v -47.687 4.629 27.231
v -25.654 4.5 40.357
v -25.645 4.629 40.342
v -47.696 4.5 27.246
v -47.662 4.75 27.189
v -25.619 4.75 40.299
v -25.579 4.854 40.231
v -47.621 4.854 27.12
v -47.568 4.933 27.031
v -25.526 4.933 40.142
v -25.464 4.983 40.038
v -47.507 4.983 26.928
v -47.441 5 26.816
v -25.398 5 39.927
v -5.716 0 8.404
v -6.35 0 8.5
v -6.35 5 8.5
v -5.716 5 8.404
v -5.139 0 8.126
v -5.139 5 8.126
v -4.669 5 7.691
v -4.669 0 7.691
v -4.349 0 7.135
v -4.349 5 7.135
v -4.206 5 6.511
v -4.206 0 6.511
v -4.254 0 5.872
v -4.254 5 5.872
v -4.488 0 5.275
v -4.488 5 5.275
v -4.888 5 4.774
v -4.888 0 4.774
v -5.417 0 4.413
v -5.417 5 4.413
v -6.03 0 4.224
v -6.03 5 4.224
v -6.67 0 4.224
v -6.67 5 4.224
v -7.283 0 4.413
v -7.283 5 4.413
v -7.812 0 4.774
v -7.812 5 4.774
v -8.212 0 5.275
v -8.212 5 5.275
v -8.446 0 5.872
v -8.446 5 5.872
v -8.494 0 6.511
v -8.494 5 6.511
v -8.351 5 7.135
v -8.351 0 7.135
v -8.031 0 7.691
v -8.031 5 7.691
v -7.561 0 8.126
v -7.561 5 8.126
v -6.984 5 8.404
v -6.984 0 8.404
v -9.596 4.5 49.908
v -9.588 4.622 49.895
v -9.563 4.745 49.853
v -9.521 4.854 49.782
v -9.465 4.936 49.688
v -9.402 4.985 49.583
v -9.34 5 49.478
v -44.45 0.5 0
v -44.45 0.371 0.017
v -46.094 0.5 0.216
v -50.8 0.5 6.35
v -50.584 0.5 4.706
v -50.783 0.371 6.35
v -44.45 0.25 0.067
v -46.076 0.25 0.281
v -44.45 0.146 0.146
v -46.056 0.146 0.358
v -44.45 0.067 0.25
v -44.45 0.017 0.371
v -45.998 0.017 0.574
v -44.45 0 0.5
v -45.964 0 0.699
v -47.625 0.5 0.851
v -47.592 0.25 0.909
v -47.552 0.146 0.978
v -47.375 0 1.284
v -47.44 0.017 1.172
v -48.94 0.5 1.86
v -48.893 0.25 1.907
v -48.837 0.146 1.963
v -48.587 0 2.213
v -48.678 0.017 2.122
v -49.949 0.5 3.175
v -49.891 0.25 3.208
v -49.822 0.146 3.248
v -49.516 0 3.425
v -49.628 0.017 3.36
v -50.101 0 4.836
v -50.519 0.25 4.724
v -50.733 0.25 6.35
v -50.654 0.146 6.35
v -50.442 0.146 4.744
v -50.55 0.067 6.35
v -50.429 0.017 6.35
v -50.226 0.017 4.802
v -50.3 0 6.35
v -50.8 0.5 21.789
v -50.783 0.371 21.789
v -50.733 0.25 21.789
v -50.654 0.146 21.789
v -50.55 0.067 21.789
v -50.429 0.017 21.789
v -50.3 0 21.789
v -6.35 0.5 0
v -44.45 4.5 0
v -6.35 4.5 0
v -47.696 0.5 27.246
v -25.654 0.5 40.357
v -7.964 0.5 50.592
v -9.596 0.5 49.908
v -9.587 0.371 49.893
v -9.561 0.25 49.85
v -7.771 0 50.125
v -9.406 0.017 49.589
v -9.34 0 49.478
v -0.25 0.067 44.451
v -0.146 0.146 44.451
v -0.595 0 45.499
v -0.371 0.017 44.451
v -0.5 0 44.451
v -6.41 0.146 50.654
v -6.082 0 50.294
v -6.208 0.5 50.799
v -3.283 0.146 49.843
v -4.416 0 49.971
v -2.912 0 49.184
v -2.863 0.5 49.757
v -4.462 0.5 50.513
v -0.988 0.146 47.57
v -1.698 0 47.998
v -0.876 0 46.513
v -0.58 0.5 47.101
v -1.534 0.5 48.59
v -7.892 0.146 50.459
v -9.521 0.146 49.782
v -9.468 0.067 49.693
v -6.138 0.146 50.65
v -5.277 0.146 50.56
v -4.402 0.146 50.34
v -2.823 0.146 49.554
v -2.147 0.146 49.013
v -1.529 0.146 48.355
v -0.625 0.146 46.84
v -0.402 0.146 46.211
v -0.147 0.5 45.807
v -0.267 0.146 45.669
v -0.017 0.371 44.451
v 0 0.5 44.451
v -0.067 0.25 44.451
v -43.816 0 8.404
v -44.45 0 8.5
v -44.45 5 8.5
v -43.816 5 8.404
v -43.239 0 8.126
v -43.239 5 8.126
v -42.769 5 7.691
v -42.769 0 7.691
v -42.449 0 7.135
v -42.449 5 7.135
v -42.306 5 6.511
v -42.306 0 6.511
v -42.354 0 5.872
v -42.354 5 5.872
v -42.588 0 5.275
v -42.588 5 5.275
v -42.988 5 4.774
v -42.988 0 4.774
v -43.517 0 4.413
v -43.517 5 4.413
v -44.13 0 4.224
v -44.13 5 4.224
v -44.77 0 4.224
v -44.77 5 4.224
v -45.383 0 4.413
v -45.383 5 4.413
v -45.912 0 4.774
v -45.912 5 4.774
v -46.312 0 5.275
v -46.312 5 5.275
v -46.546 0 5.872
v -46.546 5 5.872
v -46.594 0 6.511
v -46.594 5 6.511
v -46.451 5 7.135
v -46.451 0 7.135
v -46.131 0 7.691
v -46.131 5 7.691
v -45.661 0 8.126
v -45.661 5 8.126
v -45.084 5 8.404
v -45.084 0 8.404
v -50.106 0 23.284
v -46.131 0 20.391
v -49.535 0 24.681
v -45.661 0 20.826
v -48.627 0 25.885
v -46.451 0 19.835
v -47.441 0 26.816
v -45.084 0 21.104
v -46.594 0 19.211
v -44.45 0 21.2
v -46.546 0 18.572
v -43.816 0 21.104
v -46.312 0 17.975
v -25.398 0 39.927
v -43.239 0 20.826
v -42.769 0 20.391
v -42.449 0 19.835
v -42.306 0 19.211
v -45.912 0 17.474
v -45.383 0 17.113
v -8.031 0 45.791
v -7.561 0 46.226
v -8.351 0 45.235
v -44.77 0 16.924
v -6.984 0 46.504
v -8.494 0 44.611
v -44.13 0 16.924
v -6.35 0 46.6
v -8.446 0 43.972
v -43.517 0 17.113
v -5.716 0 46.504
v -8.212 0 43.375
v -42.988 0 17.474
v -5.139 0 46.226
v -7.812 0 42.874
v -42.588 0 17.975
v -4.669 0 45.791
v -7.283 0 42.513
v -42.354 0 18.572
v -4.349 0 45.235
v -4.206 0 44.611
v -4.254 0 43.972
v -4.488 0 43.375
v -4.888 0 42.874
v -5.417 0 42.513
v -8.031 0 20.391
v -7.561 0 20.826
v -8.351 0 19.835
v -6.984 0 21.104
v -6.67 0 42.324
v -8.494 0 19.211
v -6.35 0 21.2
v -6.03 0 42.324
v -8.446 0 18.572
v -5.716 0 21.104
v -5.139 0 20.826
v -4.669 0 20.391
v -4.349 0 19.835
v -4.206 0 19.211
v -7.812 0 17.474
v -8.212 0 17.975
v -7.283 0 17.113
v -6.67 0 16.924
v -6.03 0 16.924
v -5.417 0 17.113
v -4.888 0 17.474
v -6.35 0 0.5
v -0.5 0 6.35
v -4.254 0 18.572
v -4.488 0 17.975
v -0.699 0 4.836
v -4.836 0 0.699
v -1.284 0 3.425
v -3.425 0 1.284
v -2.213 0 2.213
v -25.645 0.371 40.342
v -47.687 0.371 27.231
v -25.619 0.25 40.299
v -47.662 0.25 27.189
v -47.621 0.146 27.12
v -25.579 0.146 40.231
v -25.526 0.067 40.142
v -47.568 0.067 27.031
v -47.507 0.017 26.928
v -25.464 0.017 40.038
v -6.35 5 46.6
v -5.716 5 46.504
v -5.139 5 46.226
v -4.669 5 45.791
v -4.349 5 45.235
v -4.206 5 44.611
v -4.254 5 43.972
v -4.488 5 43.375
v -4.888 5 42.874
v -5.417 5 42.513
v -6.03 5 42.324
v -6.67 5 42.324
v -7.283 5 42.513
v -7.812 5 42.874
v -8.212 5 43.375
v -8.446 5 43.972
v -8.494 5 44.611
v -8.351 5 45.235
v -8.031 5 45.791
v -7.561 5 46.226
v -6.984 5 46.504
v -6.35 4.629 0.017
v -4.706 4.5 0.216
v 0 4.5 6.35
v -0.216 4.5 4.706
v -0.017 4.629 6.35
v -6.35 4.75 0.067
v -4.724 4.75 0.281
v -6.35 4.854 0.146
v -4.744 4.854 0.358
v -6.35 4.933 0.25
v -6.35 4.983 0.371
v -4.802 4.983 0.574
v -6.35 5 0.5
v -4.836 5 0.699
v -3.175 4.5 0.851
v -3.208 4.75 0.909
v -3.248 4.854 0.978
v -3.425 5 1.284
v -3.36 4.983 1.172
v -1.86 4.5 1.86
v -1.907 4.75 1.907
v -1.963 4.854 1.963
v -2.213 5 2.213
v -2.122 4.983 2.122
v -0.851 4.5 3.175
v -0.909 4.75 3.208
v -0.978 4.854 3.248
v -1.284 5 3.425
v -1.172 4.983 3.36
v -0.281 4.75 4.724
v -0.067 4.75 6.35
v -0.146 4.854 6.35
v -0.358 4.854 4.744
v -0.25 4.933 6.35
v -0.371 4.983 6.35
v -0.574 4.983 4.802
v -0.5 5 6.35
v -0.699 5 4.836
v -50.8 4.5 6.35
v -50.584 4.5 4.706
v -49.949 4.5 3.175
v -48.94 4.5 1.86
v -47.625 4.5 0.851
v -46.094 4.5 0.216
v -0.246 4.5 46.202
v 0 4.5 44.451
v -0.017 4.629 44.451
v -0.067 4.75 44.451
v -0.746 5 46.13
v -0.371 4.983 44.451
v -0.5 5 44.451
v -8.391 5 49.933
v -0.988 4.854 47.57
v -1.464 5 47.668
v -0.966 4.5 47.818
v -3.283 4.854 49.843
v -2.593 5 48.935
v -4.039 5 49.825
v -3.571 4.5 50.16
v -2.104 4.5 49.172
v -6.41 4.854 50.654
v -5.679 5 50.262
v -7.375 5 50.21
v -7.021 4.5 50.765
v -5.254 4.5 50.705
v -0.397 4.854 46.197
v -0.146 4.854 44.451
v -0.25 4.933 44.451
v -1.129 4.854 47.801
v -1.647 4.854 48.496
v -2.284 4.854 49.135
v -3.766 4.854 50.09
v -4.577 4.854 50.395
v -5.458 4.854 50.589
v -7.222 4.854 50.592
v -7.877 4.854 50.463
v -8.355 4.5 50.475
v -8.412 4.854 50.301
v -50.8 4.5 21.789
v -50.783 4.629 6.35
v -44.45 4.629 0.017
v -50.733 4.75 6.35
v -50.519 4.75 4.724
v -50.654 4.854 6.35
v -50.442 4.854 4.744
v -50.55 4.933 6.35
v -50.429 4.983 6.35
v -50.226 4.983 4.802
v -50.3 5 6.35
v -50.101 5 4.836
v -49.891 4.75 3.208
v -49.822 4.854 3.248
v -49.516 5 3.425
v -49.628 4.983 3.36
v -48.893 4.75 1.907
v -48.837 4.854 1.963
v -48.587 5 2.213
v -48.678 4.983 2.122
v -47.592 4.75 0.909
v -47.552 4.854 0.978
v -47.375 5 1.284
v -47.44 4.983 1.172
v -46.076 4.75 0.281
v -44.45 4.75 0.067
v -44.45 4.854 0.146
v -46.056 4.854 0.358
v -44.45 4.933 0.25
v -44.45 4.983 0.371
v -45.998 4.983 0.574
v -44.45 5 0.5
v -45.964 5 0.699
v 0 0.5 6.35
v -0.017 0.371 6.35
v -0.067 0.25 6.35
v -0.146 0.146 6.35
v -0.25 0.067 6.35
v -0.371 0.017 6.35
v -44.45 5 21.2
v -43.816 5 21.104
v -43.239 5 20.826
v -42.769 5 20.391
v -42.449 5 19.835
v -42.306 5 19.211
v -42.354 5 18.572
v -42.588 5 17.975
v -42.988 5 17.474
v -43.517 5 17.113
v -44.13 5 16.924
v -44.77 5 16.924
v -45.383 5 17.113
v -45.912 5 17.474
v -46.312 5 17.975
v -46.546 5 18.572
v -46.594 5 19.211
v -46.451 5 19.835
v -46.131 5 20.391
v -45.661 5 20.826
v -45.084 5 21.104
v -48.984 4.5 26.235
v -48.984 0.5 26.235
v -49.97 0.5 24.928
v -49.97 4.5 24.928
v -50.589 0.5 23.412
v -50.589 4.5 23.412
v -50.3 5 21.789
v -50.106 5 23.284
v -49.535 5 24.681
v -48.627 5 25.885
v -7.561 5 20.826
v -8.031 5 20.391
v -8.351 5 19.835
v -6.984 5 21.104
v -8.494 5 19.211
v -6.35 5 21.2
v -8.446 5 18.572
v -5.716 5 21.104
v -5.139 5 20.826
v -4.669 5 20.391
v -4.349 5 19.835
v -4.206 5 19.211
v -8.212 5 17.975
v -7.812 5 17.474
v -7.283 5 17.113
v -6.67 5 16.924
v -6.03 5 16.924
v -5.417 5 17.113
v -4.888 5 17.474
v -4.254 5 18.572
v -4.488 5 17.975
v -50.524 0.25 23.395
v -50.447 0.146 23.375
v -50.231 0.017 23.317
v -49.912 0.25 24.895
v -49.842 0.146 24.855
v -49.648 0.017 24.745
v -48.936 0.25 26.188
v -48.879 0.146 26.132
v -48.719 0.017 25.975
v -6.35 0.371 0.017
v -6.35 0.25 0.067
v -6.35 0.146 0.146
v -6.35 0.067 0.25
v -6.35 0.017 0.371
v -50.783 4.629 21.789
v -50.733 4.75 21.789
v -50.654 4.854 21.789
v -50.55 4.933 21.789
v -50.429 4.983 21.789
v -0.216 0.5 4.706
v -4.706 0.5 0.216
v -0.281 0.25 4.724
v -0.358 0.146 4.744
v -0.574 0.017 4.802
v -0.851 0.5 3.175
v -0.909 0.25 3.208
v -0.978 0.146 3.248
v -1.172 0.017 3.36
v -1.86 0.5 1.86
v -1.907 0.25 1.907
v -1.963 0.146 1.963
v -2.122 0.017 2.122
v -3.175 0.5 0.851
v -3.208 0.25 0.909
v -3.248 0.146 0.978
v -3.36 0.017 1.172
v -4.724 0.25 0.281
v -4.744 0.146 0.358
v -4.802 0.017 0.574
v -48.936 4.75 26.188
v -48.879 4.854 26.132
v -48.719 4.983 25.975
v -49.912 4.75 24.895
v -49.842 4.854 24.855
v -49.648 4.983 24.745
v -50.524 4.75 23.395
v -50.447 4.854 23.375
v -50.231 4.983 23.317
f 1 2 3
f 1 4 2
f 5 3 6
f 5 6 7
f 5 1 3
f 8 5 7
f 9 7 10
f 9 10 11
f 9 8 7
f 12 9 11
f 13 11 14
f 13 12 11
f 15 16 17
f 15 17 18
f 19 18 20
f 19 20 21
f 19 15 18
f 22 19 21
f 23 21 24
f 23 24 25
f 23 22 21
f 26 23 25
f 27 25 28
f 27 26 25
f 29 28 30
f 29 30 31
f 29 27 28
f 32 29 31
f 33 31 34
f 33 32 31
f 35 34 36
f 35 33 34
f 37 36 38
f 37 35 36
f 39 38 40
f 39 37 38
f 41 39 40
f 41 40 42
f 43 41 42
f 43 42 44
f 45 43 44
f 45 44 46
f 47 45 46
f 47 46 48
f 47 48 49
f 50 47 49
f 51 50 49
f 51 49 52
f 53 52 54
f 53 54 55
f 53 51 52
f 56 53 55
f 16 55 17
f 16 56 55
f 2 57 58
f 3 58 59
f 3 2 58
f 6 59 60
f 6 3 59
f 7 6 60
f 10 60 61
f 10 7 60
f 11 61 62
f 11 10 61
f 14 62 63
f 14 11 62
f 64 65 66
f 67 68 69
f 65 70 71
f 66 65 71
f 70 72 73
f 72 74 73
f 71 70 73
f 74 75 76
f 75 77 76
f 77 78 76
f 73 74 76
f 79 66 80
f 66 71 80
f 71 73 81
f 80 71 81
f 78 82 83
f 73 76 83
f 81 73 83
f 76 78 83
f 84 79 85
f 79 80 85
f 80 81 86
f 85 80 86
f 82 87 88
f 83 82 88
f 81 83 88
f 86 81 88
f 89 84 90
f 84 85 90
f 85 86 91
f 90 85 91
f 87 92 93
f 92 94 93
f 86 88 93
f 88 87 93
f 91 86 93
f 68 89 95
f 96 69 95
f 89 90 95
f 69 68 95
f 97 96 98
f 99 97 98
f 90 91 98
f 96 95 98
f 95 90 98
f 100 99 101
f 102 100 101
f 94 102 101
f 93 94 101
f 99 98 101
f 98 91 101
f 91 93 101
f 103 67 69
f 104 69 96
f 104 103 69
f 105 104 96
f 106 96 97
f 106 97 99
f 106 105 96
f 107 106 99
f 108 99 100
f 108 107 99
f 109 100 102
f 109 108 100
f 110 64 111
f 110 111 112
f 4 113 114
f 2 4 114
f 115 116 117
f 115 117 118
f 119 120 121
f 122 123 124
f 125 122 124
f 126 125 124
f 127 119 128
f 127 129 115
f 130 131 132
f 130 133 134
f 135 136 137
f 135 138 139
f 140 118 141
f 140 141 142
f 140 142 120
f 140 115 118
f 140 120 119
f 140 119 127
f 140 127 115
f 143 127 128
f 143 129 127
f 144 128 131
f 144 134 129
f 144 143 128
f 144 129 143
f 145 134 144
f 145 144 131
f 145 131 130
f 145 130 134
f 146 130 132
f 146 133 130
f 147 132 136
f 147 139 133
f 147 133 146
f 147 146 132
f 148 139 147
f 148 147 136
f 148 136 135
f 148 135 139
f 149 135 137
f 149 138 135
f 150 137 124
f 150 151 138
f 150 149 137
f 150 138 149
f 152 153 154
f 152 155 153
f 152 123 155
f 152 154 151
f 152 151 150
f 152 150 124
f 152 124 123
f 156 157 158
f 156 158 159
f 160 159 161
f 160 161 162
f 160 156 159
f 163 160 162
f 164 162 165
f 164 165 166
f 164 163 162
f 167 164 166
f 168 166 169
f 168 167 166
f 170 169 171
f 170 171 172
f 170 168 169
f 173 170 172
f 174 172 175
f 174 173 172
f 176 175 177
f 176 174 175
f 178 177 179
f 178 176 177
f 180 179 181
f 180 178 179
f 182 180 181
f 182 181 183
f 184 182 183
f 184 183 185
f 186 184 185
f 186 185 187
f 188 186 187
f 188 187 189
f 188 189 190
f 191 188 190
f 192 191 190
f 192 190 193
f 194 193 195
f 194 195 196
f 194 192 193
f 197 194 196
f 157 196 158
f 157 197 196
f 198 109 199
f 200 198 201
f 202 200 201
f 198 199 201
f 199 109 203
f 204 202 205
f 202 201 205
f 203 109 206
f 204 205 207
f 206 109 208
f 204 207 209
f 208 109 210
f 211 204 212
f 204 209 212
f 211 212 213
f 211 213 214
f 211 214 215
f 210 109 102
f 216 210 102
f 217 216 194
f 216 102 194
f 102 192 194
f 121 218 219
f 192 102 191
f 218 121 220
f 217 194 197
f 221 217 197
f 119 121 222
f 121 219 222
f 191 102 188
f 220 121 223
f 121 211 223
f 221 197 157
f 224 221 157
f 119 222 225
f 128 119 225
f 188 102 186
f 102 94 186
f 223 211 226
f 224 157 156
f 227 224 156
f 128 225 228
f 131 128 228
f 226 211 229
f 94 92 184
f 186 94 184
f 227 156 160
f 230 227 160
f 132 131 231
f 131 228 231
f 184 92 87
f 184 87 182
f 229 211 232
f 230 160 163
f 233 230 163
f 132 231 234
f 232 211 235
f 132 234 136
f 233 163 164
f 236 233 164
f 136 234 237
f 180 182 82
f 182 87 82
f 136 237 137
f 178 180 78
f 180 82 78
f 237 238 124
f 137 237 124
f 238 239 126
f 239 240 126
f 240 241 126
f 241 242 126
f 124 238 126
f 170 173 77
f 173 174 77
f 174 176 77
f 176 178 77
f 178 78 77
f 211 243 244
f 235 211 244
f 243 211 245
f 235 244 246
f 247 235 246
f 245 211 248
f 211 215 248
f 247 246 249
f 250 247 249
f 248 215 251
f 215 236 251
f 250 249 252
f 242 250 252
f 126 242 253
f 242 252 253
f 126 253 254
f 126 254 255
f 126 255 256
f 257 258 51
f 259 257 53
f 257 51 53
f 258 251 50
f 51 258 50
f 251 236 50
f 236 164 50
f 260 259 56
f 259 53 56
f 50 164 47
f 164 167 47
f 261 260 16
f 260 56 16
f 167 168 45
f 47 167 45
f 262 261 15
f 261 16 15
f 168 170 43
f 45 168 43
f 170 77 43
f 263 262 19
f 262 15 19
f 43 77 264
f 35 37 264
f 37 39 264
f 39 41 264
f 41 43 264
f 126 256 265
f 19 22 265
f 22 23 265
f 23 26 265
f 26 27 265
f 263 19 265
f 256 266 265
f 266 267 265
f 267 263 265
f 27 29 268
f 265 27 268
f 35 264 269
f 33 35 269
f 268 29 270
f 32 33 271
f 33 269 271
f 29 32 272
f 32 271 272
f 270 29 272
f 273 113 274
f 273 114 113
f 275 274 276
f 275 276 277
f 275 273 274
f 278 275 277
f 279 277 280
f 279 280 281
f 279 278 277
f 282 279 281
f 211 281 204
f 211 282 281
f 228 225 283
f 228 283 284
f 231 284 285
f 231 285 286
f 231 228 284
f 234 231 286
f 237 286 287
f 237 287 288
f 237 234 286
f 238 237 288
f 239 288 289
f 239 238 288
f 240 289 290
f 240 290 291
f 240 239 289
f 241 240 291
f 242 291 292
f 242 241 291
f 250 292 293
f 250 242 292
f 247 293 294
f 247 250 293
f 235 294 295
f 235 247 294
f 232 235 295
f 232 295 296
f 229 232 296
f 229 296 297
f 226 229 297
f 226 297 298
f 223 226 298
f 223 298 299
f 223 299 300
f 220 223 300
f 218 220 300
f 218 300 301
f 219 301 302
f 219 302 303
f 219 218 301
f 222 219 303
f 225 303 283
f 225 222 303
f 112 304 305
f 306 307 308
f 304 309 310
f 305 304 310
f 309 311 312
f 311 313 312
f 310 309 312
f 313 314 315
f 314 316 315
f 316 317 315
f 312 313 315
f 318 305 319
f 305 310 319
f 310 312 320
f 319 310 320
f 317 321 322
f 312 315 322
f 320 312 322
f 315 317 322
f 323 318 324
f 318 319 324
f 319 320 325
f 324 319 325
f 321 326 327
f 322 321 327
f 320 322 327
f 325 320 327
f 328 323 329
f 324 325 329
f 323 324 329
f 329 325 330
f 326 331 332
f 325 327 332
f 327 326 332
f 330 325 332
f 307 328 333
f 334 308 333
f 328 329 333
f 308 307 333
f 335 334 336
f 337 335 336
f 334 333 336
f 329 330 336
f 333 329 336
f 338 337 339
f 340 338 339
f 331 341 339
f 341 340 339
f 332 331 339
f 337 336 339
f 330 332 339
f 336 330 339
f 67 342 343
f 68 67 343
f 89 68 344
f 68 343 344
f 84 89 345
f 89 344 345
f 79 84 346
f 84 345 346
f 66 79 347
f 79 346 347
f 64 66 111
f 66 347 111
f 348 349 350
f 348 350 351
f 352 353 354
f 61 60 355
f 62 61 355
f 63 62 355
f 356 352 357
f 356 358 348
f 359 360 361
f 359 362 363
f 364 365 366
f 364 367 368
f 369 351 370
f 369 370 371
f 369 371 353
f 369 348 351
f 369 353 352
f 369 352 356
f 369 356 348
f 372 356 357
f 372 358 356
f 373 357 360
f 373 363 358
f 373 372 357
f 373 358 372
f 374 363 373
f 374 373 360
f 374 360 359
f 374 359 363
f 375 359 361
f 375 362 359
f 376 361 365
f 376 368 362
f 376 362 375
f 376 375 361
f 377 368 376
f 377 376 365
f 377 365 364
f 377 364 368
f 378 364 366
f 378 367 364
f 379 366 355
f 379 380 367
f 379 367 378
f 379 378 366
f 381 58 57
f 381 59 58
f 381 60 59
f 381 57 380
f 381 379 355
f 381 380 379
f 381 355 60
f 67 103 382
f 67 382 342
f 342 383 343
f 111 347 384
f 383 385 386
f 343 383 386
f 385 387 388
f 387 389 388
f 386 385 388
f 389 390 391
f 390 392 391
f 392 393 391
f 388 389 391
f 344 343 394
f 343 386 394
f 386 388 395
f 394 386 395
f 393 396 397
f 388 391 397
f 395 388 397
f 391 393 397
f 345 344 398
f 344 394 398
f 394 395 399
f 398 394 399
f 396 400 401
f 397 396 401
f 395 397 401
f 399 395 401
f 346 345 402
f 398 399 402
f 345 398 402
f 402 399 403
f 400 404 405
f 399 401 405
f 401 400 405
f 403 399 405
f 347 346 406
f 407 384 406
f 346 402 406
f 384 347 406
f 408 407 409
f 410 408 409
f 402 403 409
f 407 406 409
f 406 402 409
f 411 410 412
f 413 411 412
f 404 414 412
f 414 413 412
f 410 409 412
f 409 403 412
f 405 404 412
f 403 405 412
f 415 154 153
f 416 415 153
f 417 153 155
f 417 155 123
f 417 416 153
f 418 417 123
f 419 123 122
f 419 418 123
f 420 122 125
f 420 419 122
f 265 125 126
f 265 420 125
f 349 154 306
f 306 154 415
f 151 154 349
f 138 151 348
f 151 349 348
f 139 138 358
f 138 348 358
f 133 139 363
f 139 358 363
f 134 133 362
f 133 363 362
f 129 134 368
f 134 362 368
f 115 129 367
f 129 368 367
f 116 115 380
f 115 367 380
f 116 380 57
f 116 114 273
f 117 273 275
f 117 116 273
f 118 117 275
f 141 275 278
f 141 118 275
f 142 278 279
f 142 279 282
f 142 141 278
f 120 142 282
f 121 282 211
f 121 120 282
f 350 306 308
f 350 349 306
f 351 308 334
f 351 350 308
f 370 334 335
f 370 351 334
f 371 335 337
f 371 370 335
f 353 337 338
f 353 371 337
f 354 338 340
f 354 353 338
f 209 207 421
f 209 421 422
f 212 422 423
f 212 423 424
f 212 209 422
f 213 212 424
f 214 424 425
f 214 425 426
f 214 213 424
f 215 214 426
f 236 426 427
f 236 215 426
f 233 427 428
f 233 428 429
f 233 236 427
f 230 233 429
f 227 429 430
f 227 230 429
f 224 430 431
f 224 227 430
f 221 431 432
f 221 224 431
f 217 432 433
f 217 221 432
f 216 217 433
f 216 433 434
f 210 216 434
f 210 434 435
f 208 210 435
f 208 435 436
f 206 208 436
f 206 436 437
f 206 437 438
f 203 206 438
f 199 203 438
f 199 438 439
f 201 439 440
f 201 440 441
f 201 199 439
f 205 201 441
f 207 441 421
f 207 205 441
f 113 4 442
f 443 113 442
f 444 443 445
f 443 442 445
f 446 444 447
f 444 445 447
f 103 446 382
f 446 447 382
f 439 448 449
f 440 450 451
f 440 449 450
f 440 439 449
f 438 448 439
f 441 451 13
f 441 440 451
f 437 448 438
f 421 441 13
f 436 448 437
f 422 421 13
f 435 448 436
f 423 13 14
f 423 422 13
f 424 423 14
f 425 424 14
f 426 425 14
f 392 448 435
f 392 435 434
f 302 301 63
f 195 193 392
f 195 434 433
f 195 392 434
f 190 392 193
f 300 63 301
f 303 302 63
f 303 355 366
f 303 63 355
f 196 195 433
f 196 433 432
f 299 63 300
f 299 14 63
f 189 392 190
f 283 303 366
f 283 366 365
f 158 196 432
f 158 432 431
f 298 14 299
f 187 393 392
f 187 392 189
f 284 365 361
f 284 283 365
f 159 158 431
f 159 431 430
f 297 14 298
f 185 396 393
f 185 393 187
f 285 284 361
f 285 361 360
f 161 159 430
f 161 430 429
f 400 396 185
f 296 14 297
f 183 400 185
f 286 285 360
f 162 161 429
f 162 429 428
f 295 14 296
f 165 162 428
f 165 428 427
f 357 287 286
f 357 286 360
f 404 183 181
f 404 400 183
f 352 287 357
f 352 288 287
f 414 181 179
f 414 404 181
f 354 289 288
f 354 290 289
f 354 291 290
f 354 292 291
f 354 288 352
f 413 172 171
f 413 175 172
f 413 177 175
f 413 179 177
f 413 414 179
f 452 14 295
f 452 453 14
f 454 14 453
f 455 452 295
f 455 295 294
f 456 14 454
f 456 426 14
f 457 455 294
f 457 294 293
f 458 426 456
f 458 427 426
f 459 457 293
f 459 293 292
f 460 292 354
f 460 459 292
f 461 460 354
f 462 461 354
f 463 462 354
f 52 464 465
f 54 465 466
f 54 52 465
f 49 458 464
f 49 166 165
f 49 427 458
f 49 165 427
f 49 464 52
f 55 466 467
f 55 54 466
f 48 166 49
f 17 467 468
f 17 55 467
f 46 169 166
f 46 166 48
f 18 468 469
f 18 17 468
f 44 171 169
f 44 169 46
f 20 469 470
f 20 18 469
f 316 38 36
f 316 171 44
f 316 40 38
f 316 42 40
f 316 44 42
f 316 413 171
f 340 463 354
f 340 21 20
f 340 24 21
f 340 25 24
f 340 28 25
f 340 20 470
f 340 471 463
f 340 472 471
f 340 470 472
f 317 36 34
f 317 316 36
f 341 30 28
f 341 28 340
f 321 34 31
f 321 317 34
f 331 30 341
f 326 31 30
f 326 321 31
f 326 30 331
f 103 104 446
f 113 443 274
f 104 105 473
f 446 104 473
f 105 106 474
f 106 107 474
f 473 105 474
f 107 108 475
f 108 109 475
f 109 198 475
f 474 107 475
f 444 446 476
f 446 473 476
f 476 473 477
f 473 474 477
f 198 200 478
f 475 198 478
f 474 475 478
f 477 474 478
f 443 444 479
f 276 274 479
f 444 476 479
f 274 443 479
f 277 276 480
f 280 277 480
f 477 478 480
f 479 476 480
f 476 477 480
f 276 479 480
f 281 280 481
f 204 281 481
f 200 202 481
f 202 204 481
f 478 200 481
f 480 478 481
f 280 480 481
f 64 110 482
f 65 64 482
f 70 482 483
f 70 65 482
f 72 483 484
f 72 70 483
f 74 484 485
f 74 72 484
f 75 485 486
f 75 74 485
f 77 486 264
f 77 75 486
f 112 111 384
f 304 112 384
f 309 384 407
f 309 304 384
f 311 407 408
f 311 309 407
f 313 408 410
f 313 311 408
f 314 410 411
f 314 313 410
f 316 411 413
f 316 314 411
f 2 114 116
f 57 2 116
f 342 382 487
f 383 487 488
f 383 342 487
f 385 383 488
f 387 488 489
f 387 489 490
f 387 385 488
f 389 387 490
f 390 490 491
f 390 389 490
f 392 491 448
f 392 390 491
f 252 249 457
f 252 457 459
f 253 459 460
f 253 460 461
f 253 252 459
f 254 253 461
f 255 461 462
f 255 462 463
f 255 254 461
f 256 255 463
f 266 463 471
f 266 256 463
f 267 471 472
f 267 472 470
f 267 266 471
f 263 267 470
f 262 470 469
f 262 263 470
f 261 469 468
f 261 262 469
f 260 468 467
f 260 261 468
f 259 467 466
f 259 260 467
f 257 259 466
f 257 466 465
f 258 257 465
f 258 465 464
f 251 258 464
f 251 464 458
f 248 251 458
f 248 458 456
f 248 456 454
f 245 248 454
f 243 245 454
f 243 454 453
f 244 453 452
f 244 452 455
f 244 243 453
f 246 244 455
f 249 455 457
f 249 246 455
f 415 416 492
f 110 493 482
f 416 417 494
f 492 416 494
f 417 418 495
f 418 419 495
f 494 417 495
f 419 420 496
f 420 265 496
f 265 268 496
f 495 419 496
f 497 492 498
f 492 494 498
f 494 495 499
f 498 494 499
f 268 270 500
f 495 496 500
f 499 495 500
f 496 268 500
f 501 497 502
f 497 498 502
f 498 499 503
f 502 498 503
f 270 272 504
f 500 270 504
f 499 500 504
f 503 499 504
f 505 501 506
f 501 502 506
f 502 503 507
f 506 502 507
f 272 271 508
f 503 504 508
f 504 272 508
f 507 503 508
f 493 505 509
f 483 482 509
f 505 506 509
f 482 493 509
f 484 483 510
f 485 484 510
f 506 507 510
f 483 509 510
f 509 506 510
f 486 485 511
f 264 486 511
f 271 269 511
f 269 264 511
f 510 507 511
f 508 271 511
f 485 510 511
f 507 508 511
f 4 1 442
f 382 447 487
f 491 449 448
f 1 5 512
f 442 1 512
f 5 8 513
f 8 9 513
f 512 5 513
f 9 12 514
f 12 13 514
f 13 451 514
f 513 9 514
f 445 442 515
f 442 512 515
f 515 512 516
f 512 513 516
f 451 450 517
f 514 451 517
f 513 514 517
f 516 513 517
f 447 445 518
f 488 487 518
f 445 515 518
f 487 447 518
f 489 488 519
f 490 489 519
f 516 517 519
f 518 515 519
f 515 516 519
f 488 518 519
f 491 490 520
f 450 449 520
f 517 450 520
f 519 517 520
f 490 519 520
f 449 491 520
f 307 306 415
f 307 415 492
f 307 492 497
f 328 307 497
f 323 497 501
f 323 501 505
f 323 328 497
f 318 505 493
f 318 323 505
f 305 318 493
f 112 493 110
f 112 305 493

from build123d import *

# Parameters (mm, degrees)
SKETCH1_W           = 50.8
SKETCH1_H           = 25.4
SKETCH1_R           = 2.15
BOSS_EXTRUDE1_DEPTH = 5
FILLET1_R           = 6.35
FILLET2_R           = 6.35
FILLET3_R           = 0.5


with BuildPart() as part:
    # Sketch1 → Boss-Extrude1 (new body)
    # profile 1 of 2: a face of its own
    with BuildSketch(Plane(origin=(0, 0, 0), x_dir=(1, 0, 0), z_dir=(0, 1, 0))):
        with Locations((-25.4, -12.7)):
            Rectangle(SKETCH1_W, SKETCH1_H)
        with Locations(Location((-44.45, -19.05, 0), (0, 0, 270))):
            Circle(SKETCH1_R, mode=Mode.SUBTRACT)
        with Locations(Location((-6.35, -19.05, 0), (0, 0, 270))):
            Circle(SKETCH1_R, mode=Mode.SUBTRACT)
        with Locations(Location((-6.35, -6.35, 0), (0, 0, 270))):
            Circle(SKETCH1_R, mode=Mode.SUBTRACT)
        with Locations(Location((-44.45, -6.35, 0), (0, 0, 270))):
            Circle(SKETCH1_R, mode=Mode.SUBTRACT)
    # profile 2 of 2: a face of its own
    with BuildSketch(Plane(origin=(0, 0, 0), x_dir=(1, 0, 0), z_dir=(0, 1, 0))):
        Polygon((0, -51.838336263), (0, -25.4), (-50.8, -25.4), (-25.653556262, -40.356808445), (-6.35, -51.838336263), align=None)
        with Locations(Location((-6.35, -44.45, 0), (0, 0, 270))):
            Circle(SKETCH1_R, mode=Mode.SUBTRACT)
    extrude(amount=BOSS_EXTRUDE1_DEPTH)

    # Fillet1
    fillet1_edges = [part.edges().sort_by_distance(p)[0] for p in [
        (0, 2.5, 0),
        (-50.8, 2.5, 0),
        (-50.8, 2.5, 25.4),
        (0, 2.5, 51.838336263),
    ]]
    fillet(fillet1_edges, radius=FILLET1_R - 0.0001)  # a hair under: the kernel refuses the full size

    # Fillet2
    fillet2_edges = [part.edges().sort_by_distance(p)[0] for p in [
        (-6.35, 2.5, 51.838336263),
    ]]
    fillet(fillet2_edges, radius=FILLET2_R - 0.0004)  # a hair under: the kernel refuses the full size

    # Fillet3
    fillet3_edges = [part.edges().sort_by_distance(p)[0] for p in [
        (0, 0, 25.400301661),
        (0, 5, 25.400301661),
        (-25.4, 0, 0),
        (-28.645831614, 0, 38.577038322),
        (-50.8, 0, 14.069262895),
        (-49.969763738, 0, 24.927820308),
        (-48.94015735, 0, 1.85984265),
        (-1.85984265, 0, 1.85984265),
        (-25.4, 5, 0),
        (-50.8, 5, 14.069262895),
        (-28.645831614, 5, 38.577038322),
        (-49.969763738, 5, 24.927820308),
        (-48.94015735, 5, 1.85984265),
        (-1.85984265, 5, 1.85984265),
        (-3.210553792, 0, 49.970106285),
        (-3.210553792, 5, 49.970106285),
    ]]
    fillet(fillet3_edges, radius=FILLET3_R)


solid = part.part
